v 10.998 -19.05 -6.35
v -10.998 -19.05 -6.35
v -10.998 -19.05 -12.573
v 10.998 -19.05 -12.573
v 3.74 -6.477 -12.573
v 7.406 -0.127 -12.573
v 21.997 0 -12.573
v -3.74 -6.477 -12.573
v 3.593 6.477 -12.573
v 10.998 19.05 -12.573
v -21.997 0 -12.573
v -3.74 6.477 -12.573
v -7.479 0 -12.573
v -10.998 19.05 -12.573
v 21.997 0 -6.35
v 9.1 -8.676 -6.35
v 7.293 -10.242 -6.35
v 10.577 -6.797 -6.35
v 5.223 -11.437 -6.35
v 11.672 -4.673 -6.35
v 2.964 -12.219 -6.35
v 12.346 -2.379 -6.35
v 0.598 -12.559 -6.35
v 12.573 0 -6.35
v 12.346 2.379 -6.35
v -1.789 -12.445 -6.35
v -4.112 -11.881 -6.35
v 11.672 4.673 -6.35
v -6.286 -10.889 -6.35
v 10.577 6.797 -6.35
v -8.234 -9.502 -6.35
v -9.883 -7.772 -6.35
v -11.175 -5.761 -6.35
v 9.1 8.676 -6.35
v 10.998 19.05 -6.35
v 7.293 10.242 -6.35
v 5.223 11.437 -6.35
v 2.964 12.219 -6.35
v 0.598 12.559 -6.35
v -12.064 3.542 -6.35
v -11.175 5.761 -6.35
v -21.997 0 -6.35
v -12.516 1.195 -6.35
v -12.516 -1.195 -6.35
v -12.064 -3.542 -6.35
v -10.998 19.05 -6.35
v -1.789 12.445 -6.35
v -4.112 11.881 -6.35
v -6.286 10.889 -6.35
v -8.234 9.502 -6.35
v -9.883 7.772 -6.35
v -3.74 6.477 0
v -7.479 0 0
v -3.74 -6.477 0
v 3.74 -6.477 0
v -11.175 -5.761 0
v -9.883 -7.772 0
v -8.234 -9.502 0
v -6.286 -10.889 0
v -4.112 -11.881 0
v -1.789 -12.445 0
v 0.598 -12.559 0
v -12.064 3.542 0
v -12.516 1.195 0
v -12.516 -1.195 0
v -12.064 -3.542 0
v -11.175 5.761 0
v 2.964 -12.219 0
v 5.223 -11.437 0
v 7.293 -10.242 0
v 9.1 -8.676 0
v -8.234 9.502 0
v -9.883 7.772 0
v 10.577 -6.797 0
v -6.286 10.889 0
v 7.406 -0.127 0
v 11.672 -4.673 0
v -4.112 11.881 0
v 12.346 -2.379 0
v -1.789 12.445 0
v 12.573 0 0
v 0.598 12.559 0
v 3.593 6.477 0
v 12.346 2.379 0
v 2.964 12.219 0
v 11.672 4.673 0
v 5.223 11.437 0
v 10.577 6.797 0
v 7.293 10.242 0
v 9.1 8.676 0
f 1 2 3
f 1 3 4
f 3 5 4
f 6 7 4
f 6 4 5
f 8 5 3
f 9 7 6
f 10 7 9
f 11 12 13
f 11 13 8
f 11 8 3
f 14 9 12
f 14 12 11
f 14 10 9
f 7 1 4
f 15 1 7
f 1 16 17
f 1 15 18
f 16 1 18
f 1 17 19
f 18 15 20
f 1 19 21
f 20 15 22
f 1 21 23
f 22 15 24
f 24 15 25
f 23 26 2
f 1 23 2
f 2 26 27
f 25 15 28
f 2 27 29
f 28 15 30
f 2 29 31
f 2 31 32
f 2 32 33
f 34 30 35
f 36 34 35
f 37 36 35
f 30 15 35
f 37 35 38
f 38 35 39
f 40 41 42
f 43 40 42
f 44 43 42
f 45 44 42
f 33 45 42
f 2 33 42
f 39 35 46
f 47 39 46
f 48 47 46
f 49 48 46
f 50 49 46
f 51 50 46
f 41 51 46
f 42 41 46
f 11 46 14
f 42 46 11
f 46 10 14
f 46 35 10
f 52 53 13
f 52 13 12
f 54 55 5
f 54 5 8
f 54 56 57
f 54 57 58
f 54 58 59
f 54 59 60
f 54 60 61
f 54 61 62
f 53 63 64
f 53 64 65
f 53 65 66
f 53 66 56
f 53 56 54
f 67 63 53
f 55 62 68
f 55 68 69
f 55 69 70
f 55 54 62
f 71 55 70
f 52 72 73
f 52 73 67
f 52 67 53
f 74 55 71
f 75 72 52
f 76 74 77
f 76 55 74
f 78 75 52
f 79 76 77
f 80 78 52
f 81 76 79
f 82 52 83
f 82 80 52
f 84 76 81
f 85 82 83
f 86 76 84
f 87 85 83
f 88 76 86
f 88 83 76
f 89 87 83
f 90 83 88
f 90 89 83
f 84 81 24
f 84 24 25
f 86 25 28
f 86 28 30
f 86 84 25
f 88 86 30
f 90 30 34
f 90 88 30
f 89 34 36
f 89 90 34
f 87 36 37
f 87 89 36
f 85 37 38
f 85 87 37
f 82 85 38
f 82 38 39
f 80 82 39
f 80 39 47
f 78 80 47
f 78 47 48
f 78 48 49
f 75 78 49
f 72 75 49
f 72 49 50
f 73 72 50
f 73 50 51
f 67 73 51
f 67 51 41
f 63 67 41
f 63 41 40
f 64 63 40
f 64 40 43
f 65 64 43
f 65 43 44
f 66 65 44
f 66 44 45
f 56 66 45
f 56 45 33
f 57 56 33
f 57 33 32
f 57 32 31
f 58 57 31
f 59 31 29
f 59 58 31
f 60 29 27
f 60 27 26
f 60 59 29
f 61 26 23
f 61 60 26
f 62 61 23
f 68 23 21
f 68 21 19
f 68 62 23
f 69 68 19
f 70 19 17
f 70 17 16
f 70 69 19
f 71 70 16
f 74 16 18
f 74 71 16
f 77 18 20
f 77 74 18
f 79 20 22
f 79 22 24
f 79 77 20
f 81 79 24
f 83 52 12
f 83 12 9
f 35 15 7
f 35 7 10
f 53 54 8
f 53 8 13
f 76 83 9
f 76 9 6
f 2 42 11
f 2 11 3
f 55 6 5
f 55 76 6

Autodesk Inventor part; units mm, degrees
ref_plane "YZ Plane" through (0, 0, 0) normal (1, 0, 0) x (0, 1, 0)
ref_plane "XZ Plane" through (0, 0, 0) normal (0, 1, 0) x (-1, 0, 0)
ref_plane "XY Plane" through (0, 0, 0) normal (0, 0, 1) x (1, 0, 0)
sketch "Sketch1" plane through (0, 0, 0) normal (0, 0, 1) x (1, 0, 0)
  line L0 (3.6662, 6.35) -> (7.3323, 0)
  line L1 (7.3323, 0) -> (3.6662, -6.35)
  line L2 (3.6662, -6.35) -> (-3.6662, -6.35)
  line L3 (-3.6662, -6.35) -> (-7.3323, 0)
  line L4 (-7.3323, 0) -> (-3.6662, 6.35)
  line L5 (-3.6662, 6.35) -> (3.6662, 6.35)
  circle A0 centre (0, 0) radius 12.7
  circle A1 centre (0, 0) radius 7.3323 construction
  dimension "d0" = 12.7
  dimension "d2" = 25.4
  dimension "d3" = 5.3677
extrude "Extrusion1" add sketch "Sketch1" against normal blind 6.35
sketch "Sketch2" plane through (0, 0, -6.35) normal (0, 0, -1) x (-1, 0, 0)
  line L0 (7.3323, 0) -> (3.6662, -6.35) projected
  line L1 (3.6662, -6.35) -> (-3.6662, -6.35)
  line L2 (-3.6662, -6.35) -> (-7.3323, 0)
  line L3 (-7.3323, 0) -> (-3.6662, 6.35)
  line L4 (-3.6662, 6.35) -> (3.6662, 6.35)
  line L5 (3.6662, 6.35) -> (7.3323, 0)
  line L6 (7.3323, 0) -> (3.6662, -6.35)
  line L7 (-10.9985, 19.05) -> (10.9985, 19.05)
  line L8 (10.9985, 19.05) -> (21.997, 0)
  line L9 (21.997, 0) -> (10.9985, -19.05)
  line L10 (10.9985, -19.05) -> (-10.9985, -19.05)
  line L11 (-10.9985, -19.05) -> (-21.997, 0)
  line L12 (-21.997, 0) -> (-10.9985, 19.05)
  point P0 (0, 0)
  point P1 (0, 0)
  point P2 (0, 0)
  dimension "d7" = 12.7
  dimension "d10" = 38.1
extrude "Extrusion3" add sketch "Sketch2" along normal blind 6.35
thicken "Thicken Internal Hex Hold" operation add thickness 0.127 both sides no extend neighbours yes toward (0, 1, 0) faces at (1.2221, 6.35, -8.4667) (-4.8882, 4.2333, -8.4667) (1.2221, 14.8167, -12.7) (6.1103, -2.1167, -8.4667) (1.2221, -6.35, -8.4667) (-4.8882, -4.2333, -4.2333)
thicken "Reduce Size of Bushing Fitting" operation add thickness 0.127 both sides no extend neighbours yes toward (-0.9967573, 0.0804666, 0) faces at (12.6588, -1.0219, -4.2333)
equation "\"d13\" = printSpacing"
equation "\"d14\" = printSpacing"
equation "\"d15\" = printSpacing"
equation "\"d16\" = printSpacing"
equation "\"hexSize\" = 12.7"
equation "\"printSpacing\" = 0.127"
properties part number "1_2x1-hexBushing" material "PC/ABS Plastic"
